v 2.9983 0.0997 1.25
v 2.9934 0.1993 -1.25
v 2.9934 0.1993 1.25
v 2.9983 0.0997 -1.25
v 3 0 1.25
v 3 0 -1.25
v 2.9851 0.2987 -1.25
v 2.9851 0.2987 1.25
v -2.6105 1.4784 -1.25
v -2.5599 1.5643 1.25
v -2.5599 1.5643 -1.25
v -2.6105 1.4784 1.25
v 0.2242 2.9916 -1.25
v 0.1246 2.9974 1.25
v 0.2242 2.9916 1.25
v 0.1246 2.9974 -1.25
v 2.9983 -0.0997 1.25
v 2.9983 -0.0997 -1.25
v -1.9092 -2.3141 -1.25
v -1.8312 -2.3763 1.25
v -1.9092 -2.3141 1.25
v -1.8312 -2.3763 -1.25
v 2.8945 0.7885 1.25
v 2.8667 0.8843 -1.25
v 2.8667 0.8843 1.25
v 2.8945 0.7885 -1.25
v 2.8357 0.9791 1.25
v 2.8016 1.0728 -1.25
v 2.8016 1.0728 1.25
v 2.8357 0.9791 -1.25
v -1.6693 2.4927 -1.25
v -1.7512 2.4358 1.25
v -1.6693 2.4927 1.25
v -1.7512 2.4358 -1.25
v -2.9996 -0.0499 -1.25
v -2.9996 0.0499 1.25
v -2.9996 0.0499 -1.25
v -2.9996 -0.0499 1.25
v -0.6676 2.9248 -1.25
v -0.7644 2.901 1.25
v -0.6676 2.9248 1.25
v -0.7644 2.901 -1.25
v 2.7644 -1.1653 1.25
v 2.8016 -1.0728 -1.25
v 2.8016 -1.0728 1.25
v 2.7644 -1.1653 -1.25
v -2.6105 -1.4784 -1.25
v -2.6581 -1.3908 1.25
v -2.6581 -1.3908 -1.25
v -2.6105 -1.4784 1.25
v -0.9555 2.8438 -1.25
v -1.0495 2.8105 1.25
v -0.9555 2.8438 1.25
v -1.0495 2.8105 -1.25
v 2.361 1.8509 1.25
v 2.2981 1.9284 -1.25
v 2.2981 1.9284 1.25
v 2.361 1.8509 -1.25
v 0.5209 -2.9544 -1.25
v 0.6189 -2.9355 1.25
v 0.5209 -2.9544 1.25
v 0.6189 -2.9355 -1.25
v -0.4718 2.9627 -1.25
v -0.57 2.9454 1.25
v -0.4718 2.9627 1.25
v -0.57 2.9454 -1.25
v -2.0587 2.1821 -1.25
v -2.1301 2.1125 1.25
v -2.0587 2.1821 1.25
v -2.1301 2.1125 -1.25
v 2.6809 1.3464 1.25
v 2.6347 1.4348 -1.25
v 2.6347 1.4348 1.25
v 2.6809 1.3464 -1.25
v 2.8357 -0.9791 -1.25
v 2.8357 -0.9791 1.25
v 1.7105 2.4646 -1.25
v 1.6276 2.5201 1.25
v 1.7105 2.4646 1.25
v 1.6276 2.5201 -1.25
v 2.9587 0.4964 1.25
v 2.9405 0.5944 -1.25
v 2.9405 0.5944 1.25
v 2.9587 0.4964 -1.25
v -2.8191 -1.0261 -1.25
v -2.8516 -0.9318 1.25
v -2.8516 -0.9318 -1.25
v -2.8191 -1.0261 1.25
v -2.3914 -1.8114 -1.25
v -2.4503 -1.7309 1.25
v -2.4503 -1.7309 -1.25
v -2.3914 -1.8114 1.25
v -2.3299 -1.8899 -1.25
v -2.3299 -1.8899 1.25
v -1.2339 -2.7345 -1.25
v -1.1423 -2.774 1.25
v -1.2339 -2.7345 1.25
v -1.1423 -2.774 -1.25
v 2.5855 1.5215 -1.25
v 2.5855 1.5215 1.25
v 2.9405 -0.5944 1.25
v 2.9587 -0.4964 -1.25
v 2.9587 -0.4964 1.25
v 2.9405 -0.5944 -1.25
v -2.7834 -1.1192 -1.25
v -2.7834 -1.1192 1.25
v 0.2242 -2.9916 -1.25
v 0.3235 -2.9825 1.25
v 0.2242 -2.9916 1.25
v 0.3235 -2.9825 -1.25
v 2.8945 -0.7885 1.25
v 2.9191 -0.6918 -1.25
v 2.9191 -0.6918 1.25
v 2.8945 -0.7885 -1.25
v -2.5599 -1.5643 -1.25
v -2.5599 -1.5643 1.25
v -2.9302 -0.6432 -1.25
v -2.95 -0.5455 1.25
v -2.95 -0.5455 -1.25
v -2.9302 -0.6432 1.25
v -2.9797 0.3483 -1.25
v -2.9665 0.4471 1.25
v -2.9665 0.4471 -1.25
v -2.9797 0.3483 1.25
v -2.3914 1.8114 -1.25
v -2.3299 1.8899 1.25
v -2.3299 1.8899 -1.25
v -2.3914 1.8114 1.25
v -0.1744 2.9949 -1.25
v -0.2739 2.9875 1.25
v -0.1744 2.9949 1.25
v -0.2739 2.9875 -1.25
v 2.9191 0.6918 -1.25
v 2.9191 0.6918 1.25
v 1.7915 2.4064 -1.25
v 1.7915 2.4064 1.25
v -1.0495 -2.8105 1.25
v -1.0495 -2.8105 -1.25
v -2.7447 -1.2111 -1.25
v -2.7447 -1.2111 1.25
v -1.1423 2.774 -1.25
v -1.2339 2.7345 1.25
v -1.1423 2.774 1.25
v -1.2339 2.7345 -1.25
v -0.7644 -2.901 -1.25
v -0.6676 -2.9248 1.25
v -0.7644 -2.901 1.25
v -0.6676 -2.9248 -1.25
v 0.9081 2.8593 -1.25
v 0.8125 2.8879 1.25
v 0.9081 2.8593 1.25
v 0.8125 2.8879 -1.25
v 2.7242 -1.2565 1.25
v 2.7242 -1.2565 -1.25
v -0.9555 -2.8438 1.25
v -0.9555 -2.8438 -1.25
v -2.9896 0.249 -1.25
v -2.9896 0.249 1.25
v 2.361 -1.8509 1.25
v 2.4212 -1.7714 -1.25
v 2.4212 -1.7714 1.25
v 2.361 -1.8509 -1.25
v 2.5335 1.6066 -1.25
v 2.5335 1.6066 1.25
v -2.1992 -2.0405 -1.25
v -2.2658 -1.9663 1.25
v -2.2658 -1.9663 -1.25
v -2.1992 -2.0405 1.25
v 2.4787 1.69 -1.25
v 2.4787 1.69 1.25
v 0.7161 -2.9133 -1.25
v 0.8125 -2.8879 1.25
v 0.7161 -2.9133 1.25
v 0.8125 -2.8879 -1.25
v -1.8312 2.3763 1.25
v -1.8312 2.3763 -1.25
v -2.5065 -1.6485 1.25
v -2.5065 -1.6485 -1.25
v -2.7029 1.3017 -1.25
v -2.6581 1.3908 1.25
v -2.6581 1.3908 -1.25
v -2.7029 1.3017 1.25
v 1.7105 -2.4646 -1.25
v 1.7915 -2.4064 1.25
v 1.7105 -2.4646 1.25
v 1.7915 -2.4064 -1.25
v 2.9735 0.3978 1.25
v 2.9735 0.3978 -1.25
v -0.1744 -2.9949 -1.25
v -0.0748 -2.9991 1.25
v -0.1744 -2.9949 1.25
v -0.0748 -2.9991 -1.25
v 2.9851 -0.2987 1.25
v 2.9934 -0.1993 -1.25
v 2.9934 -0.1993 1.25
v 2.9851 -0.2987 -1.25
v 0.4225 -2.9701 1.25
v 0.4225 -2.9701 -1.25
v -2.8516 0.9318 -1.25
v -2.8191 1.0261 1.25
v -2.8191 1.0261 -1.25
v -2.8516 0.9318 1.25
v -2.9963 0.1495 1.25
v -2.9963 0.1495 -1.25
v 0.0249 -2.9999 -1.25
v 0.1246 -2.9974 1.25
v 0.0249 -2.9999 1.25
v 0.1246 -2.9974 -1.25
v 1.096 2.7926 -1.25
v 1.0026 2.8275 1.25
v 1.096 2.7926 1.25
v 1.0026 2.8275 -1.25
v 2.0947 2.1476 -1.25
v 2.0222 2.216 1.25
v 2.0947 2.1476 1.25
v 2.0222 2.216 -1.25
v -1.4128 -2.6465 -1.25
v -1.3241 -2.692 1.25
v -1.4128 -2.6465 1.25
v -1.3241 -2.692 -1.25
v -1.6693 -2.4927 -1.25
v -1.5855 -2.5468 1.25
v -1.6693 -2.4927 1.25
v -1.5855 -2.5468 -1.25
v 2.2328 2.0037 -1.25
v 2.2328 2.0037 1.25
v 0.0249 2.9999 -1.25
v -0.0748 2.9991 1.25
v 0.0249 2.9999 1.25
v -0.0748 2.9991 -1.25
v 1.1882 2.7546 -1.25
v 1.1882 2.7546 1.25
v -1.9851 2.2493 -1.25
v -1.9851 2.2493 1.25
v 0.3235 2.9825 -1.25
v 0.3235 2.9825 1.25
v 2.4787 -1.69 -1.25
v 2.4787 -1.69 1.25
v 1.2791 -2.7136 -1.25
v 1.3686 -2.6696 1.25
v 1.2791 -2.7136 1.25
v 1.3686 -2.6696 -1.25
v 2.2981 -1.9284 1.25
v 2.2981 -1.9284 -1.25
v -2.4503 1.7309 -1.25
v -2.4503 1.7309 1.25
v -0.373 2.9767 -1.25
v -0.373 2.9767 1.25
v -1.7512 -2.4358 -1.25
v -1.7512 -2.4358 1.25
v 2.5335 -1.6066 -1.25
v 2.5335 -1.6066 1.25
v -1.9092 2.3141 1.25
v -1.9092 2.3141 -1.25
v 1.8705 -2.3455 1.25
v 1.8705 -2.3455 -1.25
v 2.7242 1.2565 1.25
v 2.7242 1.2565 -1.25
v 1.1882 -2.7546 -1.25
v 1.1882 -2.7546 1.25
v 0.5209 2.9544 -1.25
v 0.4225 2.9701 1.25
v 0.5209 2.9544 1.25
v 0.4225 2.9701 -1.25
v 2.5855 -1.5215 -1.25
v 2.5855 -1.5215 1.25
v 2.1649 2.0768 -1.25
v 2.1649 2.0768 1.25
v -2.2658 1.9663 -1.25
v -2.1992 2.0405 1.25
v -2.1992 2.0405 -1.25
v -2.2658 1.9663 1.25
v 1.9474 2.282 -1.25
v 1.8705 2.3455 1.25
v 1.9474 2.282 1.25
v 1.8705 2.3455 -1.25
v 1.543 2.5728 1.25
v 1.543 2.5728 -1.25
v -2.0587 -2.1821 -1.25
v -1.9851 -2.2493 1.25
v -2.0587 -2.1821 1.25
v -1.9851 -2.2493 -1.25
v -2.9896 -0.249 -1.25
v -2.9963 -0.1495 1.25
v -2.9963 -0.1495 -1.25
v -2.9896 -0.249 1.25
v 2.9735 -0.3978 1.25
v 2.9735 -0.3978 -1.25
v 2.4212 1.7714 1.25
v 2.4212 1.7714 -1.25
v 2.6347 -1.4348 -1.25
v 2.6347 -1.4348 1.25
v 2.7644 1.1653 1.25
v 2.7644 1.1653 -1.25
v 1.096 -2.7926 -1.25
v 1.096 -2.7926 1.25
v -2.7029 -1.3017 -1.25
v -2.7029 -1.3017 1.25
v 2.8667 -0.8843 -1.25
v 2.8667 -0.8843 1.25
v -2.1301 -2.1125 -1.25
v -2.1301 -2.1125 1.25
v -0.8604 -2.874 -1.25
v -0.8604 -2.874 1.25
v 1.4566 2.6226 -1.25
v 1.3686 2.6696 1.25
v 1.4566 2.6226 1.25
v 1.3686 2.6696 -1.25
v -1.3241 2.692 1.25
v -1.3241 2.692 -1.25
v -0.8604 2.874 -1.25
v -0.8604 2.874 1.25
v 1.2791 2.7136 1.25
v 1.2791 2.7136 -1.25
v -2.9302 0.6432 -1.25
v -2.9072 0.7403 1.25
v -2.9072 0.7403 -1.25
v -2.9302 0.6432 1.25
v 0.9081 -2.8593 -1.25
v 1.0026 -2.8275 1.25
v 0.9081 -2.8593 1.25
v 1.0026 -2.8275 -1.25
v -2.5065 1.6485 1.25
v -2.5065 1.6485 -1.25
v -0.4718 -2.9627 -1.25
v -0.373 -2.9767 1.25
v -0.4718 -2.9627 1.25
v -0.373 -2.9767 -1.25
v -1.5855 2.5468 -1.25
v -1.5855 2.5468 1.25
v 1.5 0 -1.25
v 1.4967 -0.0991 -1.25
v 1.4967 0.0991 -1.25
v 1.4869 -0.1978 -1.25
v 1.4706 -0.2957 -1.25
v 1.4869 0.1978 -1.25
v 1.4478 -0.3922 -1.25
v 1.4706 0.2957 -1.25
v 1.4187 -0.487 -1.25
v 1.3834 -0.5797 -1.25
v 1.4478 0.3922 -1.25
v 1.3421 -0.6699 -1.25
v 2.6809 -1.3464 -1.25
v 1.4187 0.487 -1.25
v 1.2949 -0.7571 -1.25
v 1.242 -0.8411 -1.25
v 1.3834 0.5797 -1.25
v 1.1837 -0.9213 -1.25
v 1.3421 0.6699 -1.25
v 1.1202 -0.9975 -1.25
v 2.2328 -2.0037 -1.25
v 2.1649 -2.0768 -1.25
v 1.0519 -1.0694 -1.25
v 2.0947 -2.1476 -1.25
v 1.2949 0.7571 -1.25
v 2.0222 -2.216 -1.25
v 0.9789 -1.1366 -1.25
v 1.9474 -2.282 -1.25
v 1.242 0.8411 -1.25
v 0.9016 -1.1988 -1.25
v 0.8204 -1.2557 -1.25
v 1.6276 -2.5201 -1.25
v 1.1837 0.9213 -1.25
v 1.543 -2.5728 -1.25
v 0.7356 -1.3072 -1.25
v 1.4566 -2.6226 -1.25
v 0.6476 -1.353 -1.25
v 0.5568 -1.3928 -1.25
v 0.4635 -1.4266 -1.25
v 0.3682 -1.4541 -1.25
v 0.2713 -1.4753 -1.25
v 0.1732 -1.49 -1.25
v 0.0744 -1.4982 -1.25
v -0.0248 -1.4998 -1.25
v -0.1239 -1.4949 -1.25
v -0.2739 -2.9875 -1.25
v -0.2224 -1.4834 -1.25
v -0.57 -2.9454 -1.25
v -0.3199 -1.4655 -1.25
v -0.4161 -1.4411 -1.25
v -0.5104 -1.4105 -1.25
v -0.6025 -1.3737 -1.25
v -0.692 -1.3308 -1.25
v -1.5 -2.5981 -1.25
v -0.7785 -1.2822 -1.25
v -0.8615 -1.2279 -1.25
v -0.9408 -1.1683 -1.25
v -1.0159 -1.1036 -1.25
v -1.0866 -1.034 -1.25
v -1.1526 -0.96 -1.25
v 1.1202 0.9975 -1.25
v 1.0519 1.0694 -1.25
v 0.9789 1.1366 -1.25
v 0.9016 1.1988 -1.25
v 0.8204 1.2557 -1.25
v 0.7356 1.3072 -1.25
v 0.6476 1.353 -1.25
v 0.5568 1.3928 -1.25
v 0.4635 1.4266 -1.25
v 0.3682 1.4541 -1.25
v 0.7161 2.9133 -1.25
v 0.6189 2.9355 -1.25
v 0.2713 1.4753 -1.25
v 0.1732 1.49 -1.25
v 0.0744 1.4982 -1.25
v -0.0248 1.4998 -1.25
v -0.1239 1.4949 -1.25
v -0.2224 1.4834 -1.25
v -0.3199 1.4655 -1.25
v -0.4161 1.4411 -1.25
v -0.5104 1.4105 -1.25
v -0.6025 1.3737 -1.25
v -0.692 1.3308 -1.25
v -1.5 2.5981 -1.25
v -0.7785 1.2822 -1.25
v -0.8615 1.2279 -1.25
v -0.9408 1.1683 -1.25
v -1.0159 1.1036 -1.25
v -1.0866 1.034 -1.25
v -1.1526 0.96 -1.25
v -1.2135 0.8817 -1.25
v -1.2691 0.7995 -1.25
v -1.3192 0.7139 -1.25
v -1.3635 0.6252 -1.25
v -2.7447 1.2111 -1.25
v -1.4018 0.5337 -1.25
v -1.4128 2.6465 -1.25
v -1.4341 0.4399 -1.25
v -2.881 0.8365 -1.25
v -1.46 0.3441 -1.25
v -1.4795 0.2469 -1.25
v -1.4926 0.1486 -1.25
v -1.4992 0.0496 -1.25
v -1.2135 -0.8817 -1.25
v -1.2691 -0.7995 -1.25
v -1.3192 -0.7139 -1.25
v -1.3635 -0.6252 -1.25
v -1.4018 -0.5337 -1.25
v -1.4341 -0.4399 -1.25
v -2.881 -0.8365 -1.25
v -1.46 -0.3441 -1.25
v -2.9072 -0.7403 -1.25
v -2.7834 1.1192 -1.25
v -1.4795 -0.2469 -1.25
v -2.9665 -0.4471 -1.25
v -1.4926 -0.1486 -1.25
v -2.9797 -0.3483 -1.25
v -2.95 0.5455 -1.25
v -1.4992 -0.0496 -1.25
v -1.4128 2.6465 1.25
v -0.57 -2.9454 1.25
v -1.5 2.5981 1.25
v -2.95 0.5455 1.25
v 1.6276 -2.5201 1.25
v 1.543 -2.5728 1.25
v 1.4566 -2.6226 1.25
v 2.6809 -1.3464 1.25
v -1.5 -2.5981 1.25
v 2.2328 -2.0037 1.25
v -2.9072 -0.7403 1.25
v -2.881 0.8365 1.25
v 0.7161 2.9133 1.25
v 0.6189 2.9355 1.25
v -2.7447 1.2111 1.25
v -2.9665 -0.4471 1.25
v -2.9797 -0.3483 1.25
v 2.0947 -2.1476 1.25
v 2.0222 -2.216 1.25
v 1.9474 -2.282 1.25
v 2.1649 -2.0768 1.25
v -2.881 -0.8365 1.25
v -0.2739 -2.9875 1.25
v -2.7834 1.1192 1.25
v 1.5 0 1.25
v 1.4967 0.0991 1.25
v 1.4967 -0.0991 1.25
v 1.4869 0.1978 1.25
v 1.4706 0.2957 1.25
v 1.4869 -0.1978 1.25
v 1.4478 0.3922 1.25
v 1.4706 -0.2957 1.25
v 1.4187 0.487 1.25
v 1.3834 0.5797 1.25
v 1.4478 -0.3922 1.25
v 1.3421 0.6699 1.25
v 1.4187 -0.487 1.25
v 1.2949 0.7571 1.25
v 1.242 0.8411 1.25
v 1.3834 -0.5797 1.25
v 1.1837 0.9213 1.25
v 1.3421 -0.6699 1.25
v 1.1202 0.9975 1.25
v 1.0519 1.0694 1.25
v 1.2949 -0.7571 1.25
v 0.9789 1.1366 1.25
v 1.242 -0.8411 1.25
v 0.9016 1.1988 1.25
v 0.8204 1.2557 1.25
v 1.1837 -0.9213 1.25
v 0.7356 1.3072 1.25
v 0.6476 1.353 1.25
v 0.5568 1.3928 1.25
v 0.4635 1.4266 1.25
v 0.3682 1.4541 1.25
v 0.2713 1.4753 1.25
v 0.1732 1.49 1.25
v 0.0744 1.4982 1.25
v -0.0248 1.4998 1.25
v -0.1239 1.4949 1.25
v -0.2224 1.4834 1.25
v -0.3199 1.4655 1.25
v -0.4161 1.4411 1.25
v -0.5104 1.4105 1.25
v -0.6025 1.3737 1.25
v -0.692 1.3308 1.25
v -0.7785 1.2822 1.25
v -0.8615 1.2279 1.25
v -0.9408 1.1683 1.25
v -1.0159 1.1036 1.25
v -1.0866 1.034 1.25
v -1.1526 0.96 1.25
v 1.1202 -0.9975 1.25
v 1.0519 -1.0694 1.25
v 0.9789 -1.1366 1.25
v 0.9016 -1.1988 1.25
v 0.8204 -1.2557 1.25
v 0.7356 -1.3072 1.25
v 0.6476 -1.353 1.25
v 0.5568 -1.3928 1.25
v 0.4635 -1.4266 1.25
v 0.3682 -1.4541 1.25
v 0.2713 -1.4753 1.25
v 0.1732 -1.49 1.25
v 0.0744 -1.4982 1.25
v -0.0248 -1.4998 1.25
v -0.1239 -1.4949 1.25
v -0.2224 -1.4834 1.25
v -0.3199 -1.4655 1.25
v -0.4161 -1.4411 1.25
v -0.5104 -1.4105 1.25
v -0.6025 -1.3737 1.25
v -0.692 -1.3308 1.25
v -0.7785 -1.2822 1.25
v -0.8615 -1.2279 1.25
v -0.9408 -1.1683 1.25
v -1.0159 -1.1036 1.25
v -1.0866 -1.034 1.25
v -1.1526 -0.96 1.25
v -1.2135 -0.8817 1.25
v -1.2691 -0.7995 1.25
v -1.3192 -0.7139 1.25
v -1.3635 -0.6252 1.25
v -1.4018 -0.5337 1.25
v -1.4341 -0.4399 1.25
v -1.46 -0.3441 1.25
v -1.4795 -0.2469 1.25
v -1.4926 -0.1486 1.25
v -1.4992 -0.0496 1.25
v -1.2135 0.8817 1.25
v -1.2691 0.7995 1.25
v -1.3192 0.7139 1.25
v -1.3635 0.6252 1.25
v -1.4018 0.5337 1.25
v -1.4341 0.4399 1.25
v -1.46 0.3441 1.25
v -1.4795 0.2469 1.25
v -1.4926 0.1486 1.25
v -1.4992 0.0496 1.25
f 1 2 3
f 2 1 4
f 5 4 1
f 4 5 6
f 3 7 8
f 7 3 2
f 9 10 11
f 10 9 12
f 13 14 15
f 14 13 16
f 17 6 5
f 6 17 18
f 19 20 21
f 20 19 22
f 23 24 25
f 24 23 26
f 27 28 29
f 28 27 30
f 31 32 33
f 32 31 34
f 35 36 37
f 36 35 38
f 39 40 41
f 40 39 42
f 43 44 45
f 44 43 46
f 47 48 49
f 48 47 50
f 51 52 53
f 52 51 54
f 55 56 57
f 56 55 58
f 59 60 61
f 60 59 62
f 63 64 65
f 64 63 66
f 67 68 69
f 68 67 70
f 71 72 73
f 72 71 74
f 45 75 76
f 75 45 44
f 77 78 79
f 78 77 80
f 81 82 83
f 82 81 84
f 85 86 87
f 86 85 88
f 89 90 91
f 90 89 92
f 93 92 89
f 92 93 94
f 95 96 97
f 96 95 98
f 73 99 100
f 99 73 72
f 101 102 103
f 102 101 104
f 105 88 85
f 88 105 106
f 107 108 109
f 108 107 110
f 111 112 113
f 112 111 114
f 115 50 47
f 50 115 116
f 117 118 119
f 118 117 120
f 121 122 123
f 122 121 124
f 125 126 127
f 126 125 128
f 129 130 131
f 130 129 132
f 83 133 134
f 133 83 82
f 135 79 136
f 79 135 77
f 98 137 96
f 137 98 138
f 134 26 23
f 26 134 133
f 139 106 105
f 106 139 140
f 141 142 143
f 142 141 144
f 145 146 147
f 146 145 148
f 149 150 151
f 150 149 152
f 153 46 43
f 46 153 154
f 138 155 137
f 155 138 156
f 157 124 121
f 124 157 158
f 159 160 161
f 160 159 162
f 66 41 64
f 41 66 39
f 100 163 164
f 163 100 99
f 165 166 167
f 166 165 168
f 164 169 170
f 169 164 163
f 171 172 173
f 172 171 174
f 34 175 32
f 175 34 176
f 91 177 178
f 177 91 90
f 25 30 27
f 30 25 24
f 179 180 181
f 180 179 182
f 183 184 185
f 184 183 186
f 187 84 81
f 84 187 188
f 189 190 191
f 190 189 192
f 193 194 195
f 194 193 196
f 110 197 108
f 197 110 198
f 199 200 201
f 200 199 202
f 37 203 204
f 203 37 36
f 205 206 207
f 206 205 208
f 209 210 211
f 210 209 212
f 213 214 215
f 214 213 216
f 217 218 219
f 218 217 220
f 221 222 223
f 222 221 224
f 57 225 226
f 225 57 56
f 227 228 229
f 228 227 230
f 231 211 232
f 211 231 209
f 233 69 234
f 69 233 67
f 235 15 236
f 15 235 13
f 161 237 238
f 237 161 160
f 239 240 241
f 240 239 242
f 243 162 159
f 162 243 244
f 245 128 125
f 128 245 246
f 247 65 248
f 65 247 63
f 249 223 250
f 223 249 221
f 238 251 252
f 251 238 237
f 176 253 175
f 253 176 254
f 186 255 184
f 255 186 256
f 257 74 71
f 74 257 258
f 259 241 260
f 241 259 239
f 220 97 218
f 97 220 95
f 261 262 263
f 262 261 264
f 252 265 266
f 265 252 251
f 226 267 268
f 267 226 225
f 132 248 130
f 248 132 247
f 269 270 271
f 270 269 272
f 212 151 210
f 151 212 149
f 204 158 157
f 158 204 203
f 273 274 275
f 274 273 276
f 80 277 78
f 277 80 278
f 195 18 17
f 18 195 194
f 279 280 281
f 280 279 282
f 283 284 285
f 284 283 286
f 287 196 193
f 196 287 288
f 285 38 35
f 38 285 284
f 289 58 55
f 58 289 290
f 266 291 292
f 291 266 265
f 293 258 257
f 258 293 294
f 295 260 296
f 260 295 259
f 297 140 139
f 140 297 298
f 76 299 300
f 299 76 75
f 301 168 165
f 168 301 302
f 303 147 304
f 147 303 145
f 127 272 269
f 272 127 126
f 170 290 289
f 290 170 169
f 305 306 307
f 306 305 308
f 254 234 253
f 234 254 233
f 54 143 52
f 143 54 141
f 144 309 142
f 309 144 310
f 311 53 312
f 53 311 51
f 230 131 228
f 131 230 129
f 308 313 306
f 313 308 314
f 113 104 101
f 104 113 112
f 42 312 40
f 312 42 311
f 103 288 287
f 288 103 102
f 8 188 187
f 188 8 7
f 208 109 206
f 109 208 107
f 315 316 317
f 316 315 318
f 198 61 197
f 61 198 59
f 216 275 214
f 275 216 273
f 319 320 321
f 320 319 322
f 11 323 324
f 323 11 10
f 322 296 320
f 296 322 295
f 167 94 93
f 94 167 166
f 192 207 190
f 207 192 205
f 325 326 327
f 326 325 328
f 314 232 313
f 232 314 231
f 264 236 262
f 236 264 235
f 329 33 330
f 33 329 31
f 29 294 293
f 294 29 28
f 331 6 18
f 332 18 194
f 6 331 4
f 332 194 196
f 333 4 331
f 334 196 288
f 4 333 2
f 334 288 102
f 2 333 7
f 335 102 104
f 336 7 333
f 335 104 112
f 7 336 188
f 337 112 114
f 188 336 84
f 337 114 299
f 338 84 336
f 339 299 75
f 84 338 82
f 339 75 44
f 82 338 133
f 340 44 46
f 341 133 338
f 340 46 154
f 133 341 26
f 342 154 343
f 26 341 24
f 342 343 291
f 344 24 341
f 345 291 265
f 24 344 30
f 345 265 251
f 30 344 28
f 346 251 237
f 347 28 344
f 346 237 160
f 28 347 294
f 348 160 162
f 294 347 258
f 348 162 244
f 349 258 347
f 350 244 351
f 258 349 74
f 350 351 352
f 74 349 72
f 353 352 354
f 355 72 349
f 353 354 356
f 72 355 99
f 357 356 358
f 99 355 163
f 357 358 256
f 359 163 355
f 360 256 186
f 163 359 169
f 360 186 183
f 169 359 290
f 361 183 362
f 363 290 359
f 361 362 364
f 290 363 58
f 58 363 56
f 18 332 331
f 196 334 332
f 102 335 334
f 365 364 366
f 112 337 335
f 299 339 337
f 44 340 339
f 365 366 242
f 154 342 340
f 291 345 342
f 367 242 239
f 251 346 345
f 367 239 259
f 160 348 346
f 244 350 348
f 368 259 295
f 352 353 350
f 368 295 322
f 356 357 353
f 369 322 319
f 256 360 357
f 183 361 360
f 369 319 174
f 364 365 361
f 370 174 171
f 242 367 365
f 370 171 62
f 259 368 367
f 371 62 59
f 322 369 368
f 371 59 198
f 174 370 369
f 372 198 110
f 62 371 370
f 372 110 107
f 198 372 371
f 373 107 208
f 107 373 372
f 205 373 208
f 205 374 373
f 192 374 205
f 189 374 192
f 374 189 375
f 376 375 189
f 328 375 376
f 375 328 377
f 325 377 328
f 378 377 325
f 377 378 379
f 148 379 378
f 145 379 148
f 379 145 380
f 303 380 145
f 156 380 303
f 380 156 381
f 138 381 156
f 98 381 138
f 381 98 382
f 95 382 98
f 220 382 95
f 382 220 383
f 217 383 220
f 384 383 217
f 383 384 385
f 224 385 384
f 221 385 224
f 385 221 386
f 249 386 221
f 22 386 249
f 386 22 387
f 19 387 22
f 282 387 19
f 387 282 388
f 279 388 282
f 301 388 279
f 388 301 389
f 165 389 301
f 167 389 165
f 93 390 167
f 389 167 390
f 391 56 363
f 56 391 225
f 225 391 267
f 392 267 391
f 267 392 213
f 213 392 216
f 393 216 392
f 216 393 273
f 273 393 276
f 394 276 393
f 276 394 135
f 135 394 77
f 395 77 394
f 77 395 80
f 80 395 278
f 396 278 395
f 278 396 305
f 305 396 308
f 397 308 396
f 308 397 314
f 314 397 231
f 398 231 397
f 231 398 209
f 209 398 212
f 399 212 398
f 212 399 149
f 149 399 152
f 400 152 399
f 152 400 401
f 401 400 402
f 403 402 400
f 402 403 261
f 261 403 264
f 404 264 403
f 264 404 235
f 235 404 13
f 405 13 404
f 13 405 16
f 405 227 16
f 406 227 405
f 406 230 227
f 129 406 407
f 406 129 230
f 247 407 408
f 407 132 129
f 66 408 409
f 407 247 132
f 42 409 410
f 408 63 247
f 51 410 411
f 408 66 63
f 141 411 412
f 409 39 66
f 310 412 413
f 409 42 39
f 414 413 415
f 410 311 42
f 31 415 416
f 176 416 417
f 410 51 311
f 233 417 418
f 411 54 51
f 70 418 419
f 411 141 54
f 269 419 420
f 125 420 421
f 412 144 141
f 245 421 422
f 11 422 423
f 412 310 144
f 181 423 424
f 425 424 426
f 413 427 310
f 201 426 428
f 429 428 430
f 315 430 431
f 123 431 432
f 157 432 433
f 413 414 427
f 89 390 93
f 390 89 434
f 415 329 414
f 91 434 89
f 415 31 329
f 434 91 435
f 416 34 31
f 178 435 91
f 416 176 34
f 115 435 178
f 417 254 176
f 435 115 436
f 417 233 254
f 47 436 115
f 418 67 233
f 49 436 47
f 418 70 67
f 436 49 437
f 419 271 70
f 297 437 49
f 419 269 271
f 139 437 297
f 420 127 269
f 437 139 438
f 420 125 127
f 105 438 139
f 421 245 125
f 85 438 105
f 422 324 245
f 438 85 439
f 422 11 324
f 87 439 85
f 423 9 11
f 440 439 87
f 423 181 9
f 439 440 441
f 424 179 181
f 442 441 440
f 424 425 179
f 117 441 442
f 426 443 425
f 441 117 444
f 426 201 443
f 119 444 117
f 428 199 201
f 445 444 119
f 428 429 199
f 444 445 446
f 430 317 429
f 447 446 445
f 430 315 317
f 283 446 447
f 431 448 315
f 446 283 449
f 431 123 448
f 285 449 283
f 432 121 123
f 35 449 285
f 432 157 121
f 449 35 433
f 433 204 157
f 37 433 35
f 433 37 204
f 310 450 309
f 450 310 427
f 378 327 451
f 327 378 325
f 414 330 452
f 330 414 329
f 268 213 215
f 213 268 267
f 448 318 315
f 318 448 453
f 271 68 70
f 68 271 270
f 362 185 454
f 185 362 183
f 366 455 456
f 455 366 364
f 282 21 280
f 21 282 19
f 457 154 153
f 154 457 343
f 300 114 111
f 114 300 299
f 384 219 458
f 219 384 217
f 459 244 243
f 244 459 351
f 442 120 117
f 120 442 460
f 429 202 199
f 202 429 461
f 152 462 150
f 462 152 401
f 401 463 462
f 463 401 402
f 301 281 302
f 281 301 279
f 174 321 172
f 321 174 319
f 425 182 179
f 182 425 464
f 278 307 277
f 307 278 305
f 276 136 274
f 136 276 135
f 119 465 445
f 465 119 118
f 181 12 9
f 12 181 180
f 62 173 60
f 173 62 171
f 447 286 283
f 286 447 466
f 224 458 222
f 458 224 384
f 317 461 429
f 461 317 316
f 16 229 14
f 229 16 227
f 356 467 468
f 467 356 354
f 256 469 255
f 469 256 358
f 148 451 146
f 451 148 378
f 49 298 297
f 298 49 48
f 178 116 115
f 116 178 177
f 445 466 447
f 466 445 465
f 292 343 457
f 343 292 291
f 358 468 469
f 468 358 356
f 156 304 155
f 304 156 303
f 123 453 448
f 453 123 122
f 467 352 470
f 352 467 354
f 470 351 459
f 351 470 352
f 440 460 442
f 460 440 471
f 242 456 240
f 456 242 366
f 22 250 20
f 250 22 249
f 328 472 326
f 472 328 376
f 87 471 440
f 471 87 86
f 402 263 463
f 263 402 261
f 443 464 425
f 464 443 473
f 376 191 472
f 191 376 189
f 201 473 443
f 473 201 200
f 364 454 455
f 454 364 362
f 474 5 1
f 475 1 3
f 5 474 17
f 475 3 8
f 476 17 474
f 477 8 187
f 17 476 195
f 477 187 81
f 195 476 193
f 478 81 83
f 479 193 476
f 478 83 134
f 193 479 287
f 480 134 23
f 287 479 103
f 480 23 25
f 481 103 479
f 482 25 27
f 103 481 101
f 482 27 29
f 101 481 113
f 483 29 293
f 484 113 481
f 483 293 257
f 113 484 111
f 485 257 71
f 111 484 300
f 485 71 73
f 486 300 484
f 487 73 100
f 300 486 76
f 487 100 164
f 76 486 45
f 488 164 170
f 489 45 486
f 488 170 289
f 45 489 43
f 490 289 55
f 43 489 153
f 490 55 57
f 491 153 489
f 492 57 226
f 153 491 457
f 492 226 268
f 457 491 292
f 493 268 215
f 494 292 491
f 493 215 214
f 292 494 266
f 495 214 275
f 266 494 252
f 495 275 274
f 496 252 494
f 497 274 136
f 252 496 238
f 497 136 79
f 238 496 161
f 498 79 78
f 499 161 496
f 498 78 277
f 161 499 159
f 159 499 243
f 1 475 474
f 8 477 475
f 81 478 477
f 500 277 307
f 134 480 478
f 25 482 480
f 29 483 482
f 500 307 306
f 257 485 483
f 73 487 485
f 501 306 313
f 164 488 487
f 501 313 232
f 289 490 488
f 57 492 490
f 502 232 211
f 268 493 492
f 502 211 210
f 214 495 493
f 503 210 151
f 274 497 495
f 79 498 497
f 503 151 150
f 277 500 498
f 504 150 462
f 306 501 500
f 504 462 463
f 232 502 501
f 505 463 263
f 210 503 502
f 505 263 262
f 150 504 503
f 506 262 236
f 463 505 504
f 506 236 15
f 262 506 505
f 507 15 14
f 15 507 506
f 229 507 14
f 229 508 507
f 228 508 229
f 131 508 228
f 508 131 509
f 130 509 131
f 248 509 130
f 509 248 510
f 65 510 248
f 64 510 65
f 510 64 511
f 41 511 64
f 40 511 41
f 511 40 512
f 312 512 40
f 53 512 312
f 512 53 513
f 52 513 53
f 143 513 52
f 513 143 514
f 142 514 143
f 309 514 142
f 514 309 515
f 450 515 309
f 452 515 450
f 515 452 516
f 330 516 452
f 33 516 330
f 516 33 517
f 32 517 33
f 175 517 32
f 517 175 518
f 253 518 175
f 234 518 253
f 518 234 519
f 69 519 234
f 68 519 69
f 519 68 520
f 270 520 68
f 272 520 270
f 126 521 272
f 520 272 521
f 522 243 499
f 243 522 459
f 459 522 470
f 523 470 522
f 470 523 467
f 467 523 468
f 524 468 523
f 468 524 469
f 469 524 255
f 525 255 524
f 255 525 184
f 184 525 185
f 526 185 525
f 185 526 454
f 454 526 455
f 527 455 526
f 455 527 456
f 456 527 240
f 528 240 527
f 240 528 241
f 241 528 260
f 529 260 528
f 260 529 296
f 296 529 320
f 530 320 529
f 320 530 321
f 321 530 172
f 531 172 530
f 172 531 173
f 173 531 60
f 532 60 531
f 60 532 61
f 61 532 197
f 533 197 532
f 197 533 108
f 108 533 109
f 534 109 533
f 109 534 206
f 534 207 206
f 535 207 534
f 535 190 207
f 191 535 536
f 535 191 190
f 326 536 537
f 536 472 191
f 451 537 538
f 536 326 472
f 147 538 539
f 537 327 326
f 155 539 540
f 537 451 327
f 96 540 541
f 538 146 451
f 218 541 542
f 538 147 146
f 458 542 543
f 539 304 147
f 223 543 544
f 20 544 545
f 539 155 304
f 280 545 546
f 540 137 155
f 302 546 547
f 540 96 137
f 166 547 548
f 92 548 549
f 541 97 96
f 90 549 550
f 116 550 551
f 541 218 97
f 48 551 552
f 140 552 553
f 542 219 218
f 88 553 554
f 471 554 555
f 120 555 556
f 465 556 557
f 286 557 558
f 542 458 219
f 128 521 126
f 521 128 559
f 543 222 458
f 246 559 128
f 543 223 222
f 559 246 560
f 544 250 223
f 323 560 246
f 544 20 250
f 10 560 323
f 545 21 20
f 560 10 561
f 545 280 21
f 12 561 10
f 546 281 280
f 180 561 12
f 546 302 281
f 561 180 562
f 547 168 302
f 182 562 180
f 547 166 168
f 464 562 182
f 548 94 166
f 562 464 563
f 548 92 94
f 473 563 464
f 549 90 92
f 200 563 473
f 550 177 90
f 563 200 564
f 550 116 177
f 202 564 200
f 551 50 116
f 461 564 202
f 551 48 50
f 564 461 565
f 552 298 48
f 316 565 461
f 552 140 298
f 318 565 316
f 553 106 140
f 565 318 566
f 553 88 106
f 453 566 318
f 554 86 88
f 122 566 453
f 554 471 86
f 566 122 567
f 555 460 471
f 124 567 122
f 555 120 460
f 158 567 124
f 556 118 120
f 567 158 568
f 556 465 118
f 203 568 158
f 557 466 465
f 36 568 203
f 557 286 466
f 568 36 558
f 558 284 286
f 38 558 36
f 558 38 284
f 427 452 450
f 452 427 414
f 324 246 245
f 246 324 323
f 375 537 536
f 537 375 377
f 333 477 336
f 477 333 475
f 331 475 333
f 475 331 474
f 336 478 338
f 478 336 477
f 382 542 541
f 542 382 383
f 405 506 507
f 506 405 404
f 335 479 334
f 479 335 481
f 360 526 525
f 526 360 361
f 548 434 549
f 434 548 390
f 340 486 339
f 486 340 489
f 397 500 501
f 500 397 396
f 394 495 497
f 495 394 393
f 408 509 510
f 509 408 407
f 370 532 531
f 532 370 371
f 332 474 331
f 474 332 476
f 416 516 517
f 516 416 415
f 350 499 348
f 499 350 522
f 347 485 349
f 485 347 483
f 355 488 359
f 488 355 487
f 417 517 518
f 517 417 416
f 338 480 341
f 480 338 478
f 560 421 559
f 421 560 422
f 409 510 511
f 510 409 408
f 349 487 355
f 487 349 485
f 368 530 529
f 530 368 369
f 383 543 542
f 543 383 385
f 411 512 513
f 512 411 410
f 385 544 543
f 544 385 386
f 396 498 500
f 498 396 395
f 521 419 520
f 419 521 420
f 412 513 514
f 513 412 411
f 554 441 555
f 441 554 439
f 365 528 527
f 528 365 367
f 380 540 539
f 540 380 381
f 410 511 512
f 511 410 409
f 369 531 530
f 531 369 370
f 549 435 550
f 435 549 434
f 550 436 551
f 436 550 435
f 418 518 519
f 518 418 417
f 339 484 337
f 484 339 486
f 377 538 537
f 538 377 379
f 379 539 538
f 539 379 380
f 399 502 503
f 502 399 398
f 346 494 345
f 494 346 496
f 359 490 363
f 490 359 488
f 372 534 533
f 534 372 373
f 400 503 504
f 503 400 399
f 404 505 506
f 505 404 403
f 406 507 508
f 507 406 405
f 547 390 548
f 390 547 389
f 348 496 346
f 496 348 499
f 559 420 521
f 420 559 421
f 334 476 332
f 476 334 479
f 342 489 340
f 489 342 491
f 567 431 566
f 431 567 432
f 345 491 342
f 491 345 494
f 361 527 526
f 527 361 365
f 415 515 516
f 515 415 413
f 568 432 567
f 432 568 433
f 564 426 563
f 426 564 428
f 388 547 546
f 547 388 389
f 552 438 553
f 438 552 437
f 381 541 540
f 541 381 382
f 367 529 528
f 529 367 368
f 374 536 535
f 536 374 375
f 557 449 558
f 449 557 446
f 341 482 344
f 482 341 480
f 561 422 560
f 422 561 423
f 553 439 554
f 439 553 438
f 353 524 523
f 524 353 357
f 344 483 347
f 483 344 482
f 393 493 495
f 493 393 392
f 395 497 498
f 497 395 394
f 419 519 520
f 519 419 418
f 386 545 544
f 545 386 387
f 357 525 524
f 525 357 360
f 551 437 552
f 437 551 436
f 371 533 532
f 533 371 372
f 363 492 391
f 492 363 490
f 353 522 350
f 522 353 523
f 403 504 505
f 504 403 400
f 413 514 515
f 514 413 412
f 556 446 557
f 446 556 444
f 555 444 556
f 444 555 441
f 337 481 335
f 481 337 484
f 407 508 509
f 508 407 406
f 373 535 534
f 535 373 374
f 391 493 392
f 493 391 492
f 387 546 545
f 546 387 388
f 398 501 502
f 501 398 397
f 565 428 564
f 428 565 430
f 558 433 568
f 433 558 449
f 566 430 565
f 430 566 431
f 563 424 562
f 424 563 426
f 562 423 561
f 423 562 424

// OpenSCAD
 $fa = 1;
 $fs = 0.1;
 
 height = 2.5; // Height of the cylinder
 internal_cylinder = 3; // Diameter of the internal cylinder (cavity)
 external_cylinder = 6; // Diamter of the external cyclinder
 
 difference() {
    cylinder( height, external_cylinder / 2, external_cylinder / 2, true);
    cylinder( height + 1, internal_cylinder / 2, internal_cylinder / 2, true);
 }
 
 
